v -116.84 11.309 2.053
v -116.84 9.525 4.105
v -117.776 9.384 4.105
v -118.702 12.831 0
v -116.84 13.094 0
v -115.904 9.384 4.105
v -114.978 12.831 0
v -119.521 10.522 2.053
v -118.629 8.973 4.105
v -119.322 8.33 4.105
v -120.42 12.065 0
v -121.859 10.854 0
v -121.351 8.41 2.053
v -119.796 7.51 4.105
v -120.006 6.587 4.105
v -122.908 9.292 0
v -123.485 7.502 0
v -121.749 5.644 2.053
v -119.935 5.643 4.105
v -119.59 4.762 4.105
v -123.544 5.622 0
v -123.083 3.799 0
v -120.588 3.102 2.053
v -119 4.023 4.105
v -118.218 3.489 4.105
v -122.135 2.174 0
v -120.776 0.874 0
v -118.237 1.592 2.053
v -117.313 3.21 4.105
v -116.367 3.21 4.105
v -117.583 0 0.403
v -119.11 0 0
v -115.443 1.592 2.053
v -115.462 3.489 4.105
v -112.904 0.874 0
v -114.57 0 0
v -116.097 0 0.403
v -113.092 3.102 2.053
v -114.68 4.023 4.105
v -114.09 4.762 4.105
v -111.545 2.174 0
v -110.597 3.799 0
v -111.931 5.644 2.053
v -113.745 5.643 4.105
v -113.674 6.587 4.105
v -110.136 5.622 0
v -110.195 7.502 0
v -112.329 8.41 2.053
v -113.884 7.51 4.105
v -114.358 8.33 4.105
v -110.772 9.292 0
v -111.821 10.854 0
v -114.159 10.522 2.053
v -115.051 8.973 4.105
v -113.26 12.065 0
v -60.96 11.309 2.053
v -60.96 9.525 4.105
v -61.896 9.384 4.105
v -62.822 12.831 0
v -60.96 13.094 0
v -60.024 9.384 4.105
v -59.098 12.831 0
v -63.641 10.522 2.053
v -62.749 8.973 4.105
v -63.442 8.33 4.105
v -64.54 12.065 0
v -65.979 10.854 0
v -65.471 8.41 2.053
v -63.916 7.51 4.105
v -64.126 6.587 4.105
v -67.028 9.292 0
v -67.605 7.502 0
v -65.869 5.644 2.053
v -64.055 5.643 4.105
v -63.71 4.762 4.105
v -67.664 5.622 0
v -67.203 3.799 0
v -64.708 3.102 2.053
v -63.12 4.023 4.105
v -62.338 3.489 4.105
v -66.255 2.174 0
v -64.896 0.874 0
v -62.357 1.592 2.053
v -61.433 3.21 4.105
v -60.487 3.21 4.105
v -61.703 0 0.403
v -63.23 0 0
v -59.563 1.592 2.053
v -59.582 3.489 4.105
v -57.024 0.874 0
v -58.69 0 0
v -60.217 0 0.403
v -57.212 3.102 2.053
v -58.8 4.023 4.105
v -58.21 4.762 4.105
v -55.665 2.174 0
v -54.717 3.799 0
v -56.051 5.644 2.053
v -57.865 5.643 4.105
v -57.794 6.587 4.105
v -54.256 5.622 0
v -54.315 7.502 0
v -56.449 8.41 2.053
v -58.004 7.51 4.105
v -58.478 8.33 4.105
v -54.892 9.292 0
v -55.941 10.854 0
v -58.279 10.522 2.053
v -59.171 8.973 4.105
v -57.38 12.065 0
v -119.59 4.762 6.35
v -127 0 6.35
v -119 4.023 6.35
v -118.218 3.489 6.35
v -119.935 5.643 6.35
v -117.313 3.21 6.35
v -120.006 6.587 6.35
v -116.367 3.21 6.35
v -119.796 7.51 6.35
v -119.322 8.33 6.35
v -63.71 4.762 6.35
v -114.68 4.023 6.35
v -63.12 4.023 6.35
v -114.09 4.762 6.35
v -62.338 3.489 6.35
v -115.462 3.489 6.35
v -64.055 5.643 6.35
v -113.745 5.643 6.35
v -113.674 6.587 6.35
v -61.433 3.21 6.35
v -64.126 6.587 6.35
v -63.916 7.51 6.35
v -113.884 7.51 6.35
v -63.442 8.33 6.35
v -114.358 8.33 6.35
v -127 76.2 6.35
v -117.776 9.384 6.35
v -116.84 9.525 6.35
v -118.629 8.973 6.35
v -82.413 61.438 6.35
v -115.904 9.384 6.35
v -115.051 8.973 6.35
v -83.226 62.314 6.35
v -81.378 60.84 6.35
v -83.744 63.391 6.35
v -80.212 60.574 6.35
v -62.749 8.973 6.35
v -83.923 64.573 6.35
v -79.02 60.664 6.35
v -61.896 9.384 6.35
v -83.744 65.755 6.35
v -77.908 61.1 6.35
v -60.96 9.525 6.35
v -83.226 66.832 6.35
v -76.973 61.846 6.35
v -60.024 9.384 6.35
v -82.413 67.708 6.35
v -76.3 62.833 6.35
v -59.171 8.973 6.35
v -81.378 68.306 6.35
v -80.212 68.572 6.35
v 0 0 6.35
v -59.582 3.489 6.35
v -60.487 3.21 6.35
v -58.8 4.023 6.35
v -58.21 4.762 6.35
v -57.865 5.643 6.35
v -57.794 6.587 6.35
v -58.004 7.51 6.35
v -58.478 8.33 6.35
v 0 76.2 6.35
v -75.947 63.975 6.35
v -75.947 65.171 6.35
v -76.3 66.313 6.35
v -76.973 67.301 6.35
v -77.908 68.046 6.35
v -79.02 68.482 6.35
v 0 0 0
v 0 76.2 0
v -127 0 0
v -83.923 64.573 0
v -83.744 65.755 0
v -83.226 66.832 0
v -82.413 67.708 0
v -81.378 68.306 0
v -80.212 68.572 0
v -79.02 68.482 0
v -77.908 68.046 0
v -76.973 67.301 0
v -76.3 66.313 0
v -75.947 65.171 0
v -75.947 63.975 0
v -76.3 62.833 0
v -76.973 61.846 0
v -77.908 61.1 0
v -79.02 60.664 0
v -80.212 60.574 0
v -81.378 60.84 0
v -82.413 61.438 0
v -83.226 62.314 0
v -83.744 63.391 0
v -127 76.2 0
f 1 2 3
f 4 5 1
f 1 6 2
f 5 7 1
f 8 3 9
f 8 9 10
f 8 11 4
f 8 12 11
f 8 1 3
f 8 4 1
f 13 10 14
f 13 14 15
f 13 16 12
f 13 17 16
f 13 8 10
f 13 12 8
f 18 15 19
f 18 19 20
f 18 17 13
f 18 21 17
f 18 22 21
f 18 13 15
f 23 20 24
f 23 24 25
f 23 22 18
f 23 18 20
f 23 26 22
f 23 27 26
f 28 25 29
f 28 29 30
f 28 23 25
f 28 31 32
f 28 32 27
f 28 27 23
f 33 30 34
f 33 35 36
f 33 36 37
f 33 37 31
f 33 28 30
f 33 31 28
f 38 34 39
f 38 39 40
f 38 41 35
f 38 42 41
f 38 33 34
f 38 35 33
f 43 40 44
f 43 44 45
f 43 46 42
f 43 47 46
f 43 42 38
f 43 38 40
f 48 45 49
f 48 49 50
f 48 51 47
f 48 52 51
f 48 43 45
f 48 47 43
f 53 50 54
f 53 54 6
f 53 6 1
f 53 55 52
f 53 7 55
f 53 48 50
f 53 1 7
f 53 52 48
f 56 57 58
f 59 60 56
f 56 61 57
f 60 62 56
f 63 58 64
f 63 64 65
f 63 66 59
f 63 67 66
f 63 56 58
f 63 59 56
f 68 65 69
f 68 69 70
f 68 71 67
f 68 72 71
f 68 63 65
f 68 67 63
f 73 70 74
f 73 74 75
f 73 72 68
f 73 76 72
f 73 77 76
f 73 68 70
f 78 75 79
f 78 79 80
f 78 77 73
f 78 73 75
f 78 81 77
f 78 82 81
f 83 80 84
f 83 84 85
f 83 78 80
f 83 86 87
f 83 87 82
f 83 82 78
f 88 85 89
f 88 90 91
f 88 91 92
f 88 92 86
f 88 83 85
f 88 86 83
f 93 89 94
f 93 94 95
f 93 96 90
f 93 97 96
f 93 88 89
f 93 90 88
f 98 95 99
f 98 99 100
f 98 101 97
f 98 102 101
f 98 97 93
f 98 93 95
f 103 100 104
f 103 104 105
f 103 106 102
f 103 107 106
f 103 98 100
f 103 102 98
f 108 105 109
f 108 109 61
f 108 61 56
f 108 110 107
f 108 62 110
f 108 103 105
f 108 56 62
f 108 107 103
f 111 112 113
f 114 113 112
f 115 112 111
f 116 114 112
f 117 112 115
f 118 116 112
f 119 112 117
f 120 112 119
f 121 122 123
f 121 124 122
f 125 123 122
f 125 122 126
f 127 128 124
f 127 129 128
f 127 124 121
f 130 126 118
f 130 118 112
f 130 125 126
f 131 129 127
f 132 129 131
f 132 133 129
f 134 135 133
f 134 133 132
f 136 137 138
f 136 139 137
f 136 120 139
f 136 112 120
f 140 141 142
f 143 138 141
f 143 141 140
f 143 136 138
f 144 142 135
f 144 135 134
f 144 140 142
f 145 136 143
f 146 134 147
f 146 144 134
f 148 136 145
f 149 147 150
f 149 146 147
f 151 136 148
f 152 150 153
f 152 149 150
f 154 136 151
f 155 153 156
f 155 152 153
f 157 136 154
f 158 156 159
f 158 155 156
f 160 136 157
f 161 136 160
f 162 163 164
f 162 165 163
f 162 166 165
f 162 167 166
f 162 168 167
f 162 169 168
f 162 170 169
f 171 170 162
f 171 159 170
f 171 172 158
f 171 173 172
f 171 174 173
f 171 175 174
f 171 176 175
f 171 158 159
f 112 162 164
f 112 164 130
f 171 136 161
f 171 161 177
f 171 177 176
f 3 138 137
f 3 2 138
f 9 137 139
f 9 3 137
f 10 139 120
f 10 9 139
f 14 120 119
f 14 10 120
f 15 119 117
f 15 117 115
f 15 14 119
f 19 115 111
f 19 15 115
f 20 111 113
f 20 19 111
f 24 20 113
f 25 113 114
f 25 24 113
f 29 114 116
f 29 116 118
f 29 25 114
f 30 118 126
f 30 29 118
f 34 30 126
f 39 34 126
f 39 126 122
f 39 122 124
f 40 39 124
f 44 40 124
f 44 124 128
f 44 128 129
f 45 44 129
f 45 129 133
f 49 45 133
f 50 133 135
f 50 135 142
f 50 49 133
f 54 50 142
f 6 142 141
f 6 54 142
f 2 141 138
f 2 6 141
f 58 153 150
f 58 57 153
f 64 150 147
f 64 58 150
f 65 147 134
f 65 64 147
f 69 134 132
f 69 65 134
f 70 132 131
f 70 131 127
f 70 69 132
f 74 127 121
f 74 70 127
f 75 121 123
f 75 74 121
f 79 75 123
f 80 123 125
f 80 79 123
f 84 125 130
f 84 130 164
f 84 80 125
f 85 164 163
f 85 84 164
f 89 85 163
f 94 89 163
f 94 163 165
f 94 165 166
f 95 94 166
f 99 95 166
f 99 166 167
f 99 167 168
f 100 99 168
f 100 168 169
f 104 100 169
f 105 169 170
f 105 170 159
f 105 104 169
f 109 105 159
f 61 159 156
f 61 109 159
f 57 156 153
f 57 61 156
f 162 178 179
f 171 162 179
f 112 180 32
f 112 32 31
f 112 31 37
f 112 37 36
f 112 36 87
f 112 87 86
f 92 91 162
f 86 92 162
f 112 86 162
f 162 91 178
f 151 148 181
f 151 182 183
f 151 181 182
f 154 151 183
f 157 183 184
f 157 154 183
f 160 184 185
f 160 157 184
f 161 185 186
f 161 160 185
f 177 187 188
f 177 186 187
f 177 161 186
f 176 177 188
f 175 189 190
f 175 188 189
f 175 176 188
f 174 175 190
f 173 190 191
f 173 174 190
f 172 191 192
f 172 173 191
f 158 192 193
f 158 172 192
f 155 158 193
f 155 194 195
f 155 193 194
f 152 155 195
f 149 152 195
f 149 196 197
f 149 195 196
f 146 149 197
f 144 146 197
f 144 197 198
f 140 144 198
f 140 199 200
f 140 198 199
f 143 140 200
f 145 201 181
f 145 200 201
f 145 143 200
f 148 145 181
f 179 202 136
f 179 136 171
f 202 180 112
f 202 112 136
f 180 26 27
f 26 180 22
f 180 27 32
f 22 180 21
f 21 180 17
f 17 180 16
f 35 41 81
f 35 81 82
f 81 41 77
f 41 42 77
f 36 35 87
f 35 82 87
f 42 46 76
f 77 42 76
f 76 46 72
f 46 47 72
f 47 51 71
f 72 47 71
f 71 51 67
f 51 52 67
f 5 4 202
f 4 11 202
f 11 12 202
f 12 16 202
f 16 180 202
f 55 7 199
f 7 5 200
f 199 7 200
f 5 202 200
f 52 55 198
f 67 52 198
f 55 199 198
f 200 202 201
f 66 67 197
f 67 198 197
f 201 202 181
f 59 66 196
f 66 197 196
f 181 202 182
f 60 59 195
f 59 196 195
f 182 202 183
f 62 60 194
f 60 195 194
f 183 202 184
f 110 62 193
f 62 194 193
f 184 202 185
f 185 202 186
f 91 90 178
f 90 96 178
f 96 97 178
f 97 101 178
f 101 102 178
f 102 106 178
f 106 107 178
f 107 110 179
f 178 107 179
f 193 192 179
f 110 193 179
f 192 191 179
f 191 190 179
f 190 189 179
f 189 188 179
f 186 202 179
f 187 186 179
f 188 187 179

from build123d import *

# Parameters (mm, degrees)
SKETCH1_W                            = 127
SKETCH1_H                            = 76.2
BOSS_EXTRUDE1_DEPTH                  = 6.35
CUT_EXTRUDE1_DEPTH                   = 149.24224263
CUT_EXTRUDE1_DEPTH_BACK              = 149.24224263
SKETCH4_R                            = 4.01
F_1_4_0_25_DIAMETER_HOLE1_AT_2_COUNT = 2
F_1_4_0_25_DIAMETER_HOLE1_AT_2_PITCH = 55.88


with BuildPart() as part:
    # Sketch1 → Boss-Extrude1 (new body)
    with BuildSketch(Plane.XY):
        with Locations((-63.5, 38.1)):
            Rectangle(SKETCH1_W, SKETCH1_H)
    extrude(amount=BOSS_EXTRUDE1_DEPTH)

    # Sketch4 → Cut-Extrude1 (cut, two sides: drawn at the far end of the back side and taken through both)
    with BuildSketch(Plane(origin=(0, 0, 0), x_dir=(-1, 0, 0), z_dir=(0, 0, -1)).offset(-CUT_EXTRUDE1_DEPTH_BACK)):
        with Locations((79.912500047, 64.573038165)):
            Circle(SKETCH4_R)
    extrude(amount=CUT_EXTRUDE1_DEPTH + CUT_EXTRUDE1_DEPTH_BACK, mode=Mode.SUBTRACT)

    # Sketch8 → 1/4 (0.25) Diameter Hole1 (revolve, cut)
    with BuildSketch(Plane(origin=(-116.84, 6.35, 0), x_dir=(0, 1, 0), z_dir=(1, 0, 0))):
        Polygon((0, 0), (0, 6.35), (3.175, 6.35), (3.175, 4.105319735), (6.7437, 0), align=None)
    f_1_4_0_25_diameter_hole1 = revolve(axis=Axis((-116.84, 6.35, -6.35), (0, 0, 1)), mode=Mode.SUBTRACT)

    # 1/4 (0.25) Diameter Hole1 at 2: 1/4 (0.25) Diameter Hole1 ×2
    with Locations(*[(i * F_1_4_0_25_DIAMETER_HOLE1_AT_2_PITCH, 0, 0) for i in range(1, F_1_4_0_25_DIAMETER_HOLE1_AT_2_COUNT)]):
        add(f_1_4_0_25_diameter_hole1, mode=Mode.SUBTRACT)


solid = part.part
